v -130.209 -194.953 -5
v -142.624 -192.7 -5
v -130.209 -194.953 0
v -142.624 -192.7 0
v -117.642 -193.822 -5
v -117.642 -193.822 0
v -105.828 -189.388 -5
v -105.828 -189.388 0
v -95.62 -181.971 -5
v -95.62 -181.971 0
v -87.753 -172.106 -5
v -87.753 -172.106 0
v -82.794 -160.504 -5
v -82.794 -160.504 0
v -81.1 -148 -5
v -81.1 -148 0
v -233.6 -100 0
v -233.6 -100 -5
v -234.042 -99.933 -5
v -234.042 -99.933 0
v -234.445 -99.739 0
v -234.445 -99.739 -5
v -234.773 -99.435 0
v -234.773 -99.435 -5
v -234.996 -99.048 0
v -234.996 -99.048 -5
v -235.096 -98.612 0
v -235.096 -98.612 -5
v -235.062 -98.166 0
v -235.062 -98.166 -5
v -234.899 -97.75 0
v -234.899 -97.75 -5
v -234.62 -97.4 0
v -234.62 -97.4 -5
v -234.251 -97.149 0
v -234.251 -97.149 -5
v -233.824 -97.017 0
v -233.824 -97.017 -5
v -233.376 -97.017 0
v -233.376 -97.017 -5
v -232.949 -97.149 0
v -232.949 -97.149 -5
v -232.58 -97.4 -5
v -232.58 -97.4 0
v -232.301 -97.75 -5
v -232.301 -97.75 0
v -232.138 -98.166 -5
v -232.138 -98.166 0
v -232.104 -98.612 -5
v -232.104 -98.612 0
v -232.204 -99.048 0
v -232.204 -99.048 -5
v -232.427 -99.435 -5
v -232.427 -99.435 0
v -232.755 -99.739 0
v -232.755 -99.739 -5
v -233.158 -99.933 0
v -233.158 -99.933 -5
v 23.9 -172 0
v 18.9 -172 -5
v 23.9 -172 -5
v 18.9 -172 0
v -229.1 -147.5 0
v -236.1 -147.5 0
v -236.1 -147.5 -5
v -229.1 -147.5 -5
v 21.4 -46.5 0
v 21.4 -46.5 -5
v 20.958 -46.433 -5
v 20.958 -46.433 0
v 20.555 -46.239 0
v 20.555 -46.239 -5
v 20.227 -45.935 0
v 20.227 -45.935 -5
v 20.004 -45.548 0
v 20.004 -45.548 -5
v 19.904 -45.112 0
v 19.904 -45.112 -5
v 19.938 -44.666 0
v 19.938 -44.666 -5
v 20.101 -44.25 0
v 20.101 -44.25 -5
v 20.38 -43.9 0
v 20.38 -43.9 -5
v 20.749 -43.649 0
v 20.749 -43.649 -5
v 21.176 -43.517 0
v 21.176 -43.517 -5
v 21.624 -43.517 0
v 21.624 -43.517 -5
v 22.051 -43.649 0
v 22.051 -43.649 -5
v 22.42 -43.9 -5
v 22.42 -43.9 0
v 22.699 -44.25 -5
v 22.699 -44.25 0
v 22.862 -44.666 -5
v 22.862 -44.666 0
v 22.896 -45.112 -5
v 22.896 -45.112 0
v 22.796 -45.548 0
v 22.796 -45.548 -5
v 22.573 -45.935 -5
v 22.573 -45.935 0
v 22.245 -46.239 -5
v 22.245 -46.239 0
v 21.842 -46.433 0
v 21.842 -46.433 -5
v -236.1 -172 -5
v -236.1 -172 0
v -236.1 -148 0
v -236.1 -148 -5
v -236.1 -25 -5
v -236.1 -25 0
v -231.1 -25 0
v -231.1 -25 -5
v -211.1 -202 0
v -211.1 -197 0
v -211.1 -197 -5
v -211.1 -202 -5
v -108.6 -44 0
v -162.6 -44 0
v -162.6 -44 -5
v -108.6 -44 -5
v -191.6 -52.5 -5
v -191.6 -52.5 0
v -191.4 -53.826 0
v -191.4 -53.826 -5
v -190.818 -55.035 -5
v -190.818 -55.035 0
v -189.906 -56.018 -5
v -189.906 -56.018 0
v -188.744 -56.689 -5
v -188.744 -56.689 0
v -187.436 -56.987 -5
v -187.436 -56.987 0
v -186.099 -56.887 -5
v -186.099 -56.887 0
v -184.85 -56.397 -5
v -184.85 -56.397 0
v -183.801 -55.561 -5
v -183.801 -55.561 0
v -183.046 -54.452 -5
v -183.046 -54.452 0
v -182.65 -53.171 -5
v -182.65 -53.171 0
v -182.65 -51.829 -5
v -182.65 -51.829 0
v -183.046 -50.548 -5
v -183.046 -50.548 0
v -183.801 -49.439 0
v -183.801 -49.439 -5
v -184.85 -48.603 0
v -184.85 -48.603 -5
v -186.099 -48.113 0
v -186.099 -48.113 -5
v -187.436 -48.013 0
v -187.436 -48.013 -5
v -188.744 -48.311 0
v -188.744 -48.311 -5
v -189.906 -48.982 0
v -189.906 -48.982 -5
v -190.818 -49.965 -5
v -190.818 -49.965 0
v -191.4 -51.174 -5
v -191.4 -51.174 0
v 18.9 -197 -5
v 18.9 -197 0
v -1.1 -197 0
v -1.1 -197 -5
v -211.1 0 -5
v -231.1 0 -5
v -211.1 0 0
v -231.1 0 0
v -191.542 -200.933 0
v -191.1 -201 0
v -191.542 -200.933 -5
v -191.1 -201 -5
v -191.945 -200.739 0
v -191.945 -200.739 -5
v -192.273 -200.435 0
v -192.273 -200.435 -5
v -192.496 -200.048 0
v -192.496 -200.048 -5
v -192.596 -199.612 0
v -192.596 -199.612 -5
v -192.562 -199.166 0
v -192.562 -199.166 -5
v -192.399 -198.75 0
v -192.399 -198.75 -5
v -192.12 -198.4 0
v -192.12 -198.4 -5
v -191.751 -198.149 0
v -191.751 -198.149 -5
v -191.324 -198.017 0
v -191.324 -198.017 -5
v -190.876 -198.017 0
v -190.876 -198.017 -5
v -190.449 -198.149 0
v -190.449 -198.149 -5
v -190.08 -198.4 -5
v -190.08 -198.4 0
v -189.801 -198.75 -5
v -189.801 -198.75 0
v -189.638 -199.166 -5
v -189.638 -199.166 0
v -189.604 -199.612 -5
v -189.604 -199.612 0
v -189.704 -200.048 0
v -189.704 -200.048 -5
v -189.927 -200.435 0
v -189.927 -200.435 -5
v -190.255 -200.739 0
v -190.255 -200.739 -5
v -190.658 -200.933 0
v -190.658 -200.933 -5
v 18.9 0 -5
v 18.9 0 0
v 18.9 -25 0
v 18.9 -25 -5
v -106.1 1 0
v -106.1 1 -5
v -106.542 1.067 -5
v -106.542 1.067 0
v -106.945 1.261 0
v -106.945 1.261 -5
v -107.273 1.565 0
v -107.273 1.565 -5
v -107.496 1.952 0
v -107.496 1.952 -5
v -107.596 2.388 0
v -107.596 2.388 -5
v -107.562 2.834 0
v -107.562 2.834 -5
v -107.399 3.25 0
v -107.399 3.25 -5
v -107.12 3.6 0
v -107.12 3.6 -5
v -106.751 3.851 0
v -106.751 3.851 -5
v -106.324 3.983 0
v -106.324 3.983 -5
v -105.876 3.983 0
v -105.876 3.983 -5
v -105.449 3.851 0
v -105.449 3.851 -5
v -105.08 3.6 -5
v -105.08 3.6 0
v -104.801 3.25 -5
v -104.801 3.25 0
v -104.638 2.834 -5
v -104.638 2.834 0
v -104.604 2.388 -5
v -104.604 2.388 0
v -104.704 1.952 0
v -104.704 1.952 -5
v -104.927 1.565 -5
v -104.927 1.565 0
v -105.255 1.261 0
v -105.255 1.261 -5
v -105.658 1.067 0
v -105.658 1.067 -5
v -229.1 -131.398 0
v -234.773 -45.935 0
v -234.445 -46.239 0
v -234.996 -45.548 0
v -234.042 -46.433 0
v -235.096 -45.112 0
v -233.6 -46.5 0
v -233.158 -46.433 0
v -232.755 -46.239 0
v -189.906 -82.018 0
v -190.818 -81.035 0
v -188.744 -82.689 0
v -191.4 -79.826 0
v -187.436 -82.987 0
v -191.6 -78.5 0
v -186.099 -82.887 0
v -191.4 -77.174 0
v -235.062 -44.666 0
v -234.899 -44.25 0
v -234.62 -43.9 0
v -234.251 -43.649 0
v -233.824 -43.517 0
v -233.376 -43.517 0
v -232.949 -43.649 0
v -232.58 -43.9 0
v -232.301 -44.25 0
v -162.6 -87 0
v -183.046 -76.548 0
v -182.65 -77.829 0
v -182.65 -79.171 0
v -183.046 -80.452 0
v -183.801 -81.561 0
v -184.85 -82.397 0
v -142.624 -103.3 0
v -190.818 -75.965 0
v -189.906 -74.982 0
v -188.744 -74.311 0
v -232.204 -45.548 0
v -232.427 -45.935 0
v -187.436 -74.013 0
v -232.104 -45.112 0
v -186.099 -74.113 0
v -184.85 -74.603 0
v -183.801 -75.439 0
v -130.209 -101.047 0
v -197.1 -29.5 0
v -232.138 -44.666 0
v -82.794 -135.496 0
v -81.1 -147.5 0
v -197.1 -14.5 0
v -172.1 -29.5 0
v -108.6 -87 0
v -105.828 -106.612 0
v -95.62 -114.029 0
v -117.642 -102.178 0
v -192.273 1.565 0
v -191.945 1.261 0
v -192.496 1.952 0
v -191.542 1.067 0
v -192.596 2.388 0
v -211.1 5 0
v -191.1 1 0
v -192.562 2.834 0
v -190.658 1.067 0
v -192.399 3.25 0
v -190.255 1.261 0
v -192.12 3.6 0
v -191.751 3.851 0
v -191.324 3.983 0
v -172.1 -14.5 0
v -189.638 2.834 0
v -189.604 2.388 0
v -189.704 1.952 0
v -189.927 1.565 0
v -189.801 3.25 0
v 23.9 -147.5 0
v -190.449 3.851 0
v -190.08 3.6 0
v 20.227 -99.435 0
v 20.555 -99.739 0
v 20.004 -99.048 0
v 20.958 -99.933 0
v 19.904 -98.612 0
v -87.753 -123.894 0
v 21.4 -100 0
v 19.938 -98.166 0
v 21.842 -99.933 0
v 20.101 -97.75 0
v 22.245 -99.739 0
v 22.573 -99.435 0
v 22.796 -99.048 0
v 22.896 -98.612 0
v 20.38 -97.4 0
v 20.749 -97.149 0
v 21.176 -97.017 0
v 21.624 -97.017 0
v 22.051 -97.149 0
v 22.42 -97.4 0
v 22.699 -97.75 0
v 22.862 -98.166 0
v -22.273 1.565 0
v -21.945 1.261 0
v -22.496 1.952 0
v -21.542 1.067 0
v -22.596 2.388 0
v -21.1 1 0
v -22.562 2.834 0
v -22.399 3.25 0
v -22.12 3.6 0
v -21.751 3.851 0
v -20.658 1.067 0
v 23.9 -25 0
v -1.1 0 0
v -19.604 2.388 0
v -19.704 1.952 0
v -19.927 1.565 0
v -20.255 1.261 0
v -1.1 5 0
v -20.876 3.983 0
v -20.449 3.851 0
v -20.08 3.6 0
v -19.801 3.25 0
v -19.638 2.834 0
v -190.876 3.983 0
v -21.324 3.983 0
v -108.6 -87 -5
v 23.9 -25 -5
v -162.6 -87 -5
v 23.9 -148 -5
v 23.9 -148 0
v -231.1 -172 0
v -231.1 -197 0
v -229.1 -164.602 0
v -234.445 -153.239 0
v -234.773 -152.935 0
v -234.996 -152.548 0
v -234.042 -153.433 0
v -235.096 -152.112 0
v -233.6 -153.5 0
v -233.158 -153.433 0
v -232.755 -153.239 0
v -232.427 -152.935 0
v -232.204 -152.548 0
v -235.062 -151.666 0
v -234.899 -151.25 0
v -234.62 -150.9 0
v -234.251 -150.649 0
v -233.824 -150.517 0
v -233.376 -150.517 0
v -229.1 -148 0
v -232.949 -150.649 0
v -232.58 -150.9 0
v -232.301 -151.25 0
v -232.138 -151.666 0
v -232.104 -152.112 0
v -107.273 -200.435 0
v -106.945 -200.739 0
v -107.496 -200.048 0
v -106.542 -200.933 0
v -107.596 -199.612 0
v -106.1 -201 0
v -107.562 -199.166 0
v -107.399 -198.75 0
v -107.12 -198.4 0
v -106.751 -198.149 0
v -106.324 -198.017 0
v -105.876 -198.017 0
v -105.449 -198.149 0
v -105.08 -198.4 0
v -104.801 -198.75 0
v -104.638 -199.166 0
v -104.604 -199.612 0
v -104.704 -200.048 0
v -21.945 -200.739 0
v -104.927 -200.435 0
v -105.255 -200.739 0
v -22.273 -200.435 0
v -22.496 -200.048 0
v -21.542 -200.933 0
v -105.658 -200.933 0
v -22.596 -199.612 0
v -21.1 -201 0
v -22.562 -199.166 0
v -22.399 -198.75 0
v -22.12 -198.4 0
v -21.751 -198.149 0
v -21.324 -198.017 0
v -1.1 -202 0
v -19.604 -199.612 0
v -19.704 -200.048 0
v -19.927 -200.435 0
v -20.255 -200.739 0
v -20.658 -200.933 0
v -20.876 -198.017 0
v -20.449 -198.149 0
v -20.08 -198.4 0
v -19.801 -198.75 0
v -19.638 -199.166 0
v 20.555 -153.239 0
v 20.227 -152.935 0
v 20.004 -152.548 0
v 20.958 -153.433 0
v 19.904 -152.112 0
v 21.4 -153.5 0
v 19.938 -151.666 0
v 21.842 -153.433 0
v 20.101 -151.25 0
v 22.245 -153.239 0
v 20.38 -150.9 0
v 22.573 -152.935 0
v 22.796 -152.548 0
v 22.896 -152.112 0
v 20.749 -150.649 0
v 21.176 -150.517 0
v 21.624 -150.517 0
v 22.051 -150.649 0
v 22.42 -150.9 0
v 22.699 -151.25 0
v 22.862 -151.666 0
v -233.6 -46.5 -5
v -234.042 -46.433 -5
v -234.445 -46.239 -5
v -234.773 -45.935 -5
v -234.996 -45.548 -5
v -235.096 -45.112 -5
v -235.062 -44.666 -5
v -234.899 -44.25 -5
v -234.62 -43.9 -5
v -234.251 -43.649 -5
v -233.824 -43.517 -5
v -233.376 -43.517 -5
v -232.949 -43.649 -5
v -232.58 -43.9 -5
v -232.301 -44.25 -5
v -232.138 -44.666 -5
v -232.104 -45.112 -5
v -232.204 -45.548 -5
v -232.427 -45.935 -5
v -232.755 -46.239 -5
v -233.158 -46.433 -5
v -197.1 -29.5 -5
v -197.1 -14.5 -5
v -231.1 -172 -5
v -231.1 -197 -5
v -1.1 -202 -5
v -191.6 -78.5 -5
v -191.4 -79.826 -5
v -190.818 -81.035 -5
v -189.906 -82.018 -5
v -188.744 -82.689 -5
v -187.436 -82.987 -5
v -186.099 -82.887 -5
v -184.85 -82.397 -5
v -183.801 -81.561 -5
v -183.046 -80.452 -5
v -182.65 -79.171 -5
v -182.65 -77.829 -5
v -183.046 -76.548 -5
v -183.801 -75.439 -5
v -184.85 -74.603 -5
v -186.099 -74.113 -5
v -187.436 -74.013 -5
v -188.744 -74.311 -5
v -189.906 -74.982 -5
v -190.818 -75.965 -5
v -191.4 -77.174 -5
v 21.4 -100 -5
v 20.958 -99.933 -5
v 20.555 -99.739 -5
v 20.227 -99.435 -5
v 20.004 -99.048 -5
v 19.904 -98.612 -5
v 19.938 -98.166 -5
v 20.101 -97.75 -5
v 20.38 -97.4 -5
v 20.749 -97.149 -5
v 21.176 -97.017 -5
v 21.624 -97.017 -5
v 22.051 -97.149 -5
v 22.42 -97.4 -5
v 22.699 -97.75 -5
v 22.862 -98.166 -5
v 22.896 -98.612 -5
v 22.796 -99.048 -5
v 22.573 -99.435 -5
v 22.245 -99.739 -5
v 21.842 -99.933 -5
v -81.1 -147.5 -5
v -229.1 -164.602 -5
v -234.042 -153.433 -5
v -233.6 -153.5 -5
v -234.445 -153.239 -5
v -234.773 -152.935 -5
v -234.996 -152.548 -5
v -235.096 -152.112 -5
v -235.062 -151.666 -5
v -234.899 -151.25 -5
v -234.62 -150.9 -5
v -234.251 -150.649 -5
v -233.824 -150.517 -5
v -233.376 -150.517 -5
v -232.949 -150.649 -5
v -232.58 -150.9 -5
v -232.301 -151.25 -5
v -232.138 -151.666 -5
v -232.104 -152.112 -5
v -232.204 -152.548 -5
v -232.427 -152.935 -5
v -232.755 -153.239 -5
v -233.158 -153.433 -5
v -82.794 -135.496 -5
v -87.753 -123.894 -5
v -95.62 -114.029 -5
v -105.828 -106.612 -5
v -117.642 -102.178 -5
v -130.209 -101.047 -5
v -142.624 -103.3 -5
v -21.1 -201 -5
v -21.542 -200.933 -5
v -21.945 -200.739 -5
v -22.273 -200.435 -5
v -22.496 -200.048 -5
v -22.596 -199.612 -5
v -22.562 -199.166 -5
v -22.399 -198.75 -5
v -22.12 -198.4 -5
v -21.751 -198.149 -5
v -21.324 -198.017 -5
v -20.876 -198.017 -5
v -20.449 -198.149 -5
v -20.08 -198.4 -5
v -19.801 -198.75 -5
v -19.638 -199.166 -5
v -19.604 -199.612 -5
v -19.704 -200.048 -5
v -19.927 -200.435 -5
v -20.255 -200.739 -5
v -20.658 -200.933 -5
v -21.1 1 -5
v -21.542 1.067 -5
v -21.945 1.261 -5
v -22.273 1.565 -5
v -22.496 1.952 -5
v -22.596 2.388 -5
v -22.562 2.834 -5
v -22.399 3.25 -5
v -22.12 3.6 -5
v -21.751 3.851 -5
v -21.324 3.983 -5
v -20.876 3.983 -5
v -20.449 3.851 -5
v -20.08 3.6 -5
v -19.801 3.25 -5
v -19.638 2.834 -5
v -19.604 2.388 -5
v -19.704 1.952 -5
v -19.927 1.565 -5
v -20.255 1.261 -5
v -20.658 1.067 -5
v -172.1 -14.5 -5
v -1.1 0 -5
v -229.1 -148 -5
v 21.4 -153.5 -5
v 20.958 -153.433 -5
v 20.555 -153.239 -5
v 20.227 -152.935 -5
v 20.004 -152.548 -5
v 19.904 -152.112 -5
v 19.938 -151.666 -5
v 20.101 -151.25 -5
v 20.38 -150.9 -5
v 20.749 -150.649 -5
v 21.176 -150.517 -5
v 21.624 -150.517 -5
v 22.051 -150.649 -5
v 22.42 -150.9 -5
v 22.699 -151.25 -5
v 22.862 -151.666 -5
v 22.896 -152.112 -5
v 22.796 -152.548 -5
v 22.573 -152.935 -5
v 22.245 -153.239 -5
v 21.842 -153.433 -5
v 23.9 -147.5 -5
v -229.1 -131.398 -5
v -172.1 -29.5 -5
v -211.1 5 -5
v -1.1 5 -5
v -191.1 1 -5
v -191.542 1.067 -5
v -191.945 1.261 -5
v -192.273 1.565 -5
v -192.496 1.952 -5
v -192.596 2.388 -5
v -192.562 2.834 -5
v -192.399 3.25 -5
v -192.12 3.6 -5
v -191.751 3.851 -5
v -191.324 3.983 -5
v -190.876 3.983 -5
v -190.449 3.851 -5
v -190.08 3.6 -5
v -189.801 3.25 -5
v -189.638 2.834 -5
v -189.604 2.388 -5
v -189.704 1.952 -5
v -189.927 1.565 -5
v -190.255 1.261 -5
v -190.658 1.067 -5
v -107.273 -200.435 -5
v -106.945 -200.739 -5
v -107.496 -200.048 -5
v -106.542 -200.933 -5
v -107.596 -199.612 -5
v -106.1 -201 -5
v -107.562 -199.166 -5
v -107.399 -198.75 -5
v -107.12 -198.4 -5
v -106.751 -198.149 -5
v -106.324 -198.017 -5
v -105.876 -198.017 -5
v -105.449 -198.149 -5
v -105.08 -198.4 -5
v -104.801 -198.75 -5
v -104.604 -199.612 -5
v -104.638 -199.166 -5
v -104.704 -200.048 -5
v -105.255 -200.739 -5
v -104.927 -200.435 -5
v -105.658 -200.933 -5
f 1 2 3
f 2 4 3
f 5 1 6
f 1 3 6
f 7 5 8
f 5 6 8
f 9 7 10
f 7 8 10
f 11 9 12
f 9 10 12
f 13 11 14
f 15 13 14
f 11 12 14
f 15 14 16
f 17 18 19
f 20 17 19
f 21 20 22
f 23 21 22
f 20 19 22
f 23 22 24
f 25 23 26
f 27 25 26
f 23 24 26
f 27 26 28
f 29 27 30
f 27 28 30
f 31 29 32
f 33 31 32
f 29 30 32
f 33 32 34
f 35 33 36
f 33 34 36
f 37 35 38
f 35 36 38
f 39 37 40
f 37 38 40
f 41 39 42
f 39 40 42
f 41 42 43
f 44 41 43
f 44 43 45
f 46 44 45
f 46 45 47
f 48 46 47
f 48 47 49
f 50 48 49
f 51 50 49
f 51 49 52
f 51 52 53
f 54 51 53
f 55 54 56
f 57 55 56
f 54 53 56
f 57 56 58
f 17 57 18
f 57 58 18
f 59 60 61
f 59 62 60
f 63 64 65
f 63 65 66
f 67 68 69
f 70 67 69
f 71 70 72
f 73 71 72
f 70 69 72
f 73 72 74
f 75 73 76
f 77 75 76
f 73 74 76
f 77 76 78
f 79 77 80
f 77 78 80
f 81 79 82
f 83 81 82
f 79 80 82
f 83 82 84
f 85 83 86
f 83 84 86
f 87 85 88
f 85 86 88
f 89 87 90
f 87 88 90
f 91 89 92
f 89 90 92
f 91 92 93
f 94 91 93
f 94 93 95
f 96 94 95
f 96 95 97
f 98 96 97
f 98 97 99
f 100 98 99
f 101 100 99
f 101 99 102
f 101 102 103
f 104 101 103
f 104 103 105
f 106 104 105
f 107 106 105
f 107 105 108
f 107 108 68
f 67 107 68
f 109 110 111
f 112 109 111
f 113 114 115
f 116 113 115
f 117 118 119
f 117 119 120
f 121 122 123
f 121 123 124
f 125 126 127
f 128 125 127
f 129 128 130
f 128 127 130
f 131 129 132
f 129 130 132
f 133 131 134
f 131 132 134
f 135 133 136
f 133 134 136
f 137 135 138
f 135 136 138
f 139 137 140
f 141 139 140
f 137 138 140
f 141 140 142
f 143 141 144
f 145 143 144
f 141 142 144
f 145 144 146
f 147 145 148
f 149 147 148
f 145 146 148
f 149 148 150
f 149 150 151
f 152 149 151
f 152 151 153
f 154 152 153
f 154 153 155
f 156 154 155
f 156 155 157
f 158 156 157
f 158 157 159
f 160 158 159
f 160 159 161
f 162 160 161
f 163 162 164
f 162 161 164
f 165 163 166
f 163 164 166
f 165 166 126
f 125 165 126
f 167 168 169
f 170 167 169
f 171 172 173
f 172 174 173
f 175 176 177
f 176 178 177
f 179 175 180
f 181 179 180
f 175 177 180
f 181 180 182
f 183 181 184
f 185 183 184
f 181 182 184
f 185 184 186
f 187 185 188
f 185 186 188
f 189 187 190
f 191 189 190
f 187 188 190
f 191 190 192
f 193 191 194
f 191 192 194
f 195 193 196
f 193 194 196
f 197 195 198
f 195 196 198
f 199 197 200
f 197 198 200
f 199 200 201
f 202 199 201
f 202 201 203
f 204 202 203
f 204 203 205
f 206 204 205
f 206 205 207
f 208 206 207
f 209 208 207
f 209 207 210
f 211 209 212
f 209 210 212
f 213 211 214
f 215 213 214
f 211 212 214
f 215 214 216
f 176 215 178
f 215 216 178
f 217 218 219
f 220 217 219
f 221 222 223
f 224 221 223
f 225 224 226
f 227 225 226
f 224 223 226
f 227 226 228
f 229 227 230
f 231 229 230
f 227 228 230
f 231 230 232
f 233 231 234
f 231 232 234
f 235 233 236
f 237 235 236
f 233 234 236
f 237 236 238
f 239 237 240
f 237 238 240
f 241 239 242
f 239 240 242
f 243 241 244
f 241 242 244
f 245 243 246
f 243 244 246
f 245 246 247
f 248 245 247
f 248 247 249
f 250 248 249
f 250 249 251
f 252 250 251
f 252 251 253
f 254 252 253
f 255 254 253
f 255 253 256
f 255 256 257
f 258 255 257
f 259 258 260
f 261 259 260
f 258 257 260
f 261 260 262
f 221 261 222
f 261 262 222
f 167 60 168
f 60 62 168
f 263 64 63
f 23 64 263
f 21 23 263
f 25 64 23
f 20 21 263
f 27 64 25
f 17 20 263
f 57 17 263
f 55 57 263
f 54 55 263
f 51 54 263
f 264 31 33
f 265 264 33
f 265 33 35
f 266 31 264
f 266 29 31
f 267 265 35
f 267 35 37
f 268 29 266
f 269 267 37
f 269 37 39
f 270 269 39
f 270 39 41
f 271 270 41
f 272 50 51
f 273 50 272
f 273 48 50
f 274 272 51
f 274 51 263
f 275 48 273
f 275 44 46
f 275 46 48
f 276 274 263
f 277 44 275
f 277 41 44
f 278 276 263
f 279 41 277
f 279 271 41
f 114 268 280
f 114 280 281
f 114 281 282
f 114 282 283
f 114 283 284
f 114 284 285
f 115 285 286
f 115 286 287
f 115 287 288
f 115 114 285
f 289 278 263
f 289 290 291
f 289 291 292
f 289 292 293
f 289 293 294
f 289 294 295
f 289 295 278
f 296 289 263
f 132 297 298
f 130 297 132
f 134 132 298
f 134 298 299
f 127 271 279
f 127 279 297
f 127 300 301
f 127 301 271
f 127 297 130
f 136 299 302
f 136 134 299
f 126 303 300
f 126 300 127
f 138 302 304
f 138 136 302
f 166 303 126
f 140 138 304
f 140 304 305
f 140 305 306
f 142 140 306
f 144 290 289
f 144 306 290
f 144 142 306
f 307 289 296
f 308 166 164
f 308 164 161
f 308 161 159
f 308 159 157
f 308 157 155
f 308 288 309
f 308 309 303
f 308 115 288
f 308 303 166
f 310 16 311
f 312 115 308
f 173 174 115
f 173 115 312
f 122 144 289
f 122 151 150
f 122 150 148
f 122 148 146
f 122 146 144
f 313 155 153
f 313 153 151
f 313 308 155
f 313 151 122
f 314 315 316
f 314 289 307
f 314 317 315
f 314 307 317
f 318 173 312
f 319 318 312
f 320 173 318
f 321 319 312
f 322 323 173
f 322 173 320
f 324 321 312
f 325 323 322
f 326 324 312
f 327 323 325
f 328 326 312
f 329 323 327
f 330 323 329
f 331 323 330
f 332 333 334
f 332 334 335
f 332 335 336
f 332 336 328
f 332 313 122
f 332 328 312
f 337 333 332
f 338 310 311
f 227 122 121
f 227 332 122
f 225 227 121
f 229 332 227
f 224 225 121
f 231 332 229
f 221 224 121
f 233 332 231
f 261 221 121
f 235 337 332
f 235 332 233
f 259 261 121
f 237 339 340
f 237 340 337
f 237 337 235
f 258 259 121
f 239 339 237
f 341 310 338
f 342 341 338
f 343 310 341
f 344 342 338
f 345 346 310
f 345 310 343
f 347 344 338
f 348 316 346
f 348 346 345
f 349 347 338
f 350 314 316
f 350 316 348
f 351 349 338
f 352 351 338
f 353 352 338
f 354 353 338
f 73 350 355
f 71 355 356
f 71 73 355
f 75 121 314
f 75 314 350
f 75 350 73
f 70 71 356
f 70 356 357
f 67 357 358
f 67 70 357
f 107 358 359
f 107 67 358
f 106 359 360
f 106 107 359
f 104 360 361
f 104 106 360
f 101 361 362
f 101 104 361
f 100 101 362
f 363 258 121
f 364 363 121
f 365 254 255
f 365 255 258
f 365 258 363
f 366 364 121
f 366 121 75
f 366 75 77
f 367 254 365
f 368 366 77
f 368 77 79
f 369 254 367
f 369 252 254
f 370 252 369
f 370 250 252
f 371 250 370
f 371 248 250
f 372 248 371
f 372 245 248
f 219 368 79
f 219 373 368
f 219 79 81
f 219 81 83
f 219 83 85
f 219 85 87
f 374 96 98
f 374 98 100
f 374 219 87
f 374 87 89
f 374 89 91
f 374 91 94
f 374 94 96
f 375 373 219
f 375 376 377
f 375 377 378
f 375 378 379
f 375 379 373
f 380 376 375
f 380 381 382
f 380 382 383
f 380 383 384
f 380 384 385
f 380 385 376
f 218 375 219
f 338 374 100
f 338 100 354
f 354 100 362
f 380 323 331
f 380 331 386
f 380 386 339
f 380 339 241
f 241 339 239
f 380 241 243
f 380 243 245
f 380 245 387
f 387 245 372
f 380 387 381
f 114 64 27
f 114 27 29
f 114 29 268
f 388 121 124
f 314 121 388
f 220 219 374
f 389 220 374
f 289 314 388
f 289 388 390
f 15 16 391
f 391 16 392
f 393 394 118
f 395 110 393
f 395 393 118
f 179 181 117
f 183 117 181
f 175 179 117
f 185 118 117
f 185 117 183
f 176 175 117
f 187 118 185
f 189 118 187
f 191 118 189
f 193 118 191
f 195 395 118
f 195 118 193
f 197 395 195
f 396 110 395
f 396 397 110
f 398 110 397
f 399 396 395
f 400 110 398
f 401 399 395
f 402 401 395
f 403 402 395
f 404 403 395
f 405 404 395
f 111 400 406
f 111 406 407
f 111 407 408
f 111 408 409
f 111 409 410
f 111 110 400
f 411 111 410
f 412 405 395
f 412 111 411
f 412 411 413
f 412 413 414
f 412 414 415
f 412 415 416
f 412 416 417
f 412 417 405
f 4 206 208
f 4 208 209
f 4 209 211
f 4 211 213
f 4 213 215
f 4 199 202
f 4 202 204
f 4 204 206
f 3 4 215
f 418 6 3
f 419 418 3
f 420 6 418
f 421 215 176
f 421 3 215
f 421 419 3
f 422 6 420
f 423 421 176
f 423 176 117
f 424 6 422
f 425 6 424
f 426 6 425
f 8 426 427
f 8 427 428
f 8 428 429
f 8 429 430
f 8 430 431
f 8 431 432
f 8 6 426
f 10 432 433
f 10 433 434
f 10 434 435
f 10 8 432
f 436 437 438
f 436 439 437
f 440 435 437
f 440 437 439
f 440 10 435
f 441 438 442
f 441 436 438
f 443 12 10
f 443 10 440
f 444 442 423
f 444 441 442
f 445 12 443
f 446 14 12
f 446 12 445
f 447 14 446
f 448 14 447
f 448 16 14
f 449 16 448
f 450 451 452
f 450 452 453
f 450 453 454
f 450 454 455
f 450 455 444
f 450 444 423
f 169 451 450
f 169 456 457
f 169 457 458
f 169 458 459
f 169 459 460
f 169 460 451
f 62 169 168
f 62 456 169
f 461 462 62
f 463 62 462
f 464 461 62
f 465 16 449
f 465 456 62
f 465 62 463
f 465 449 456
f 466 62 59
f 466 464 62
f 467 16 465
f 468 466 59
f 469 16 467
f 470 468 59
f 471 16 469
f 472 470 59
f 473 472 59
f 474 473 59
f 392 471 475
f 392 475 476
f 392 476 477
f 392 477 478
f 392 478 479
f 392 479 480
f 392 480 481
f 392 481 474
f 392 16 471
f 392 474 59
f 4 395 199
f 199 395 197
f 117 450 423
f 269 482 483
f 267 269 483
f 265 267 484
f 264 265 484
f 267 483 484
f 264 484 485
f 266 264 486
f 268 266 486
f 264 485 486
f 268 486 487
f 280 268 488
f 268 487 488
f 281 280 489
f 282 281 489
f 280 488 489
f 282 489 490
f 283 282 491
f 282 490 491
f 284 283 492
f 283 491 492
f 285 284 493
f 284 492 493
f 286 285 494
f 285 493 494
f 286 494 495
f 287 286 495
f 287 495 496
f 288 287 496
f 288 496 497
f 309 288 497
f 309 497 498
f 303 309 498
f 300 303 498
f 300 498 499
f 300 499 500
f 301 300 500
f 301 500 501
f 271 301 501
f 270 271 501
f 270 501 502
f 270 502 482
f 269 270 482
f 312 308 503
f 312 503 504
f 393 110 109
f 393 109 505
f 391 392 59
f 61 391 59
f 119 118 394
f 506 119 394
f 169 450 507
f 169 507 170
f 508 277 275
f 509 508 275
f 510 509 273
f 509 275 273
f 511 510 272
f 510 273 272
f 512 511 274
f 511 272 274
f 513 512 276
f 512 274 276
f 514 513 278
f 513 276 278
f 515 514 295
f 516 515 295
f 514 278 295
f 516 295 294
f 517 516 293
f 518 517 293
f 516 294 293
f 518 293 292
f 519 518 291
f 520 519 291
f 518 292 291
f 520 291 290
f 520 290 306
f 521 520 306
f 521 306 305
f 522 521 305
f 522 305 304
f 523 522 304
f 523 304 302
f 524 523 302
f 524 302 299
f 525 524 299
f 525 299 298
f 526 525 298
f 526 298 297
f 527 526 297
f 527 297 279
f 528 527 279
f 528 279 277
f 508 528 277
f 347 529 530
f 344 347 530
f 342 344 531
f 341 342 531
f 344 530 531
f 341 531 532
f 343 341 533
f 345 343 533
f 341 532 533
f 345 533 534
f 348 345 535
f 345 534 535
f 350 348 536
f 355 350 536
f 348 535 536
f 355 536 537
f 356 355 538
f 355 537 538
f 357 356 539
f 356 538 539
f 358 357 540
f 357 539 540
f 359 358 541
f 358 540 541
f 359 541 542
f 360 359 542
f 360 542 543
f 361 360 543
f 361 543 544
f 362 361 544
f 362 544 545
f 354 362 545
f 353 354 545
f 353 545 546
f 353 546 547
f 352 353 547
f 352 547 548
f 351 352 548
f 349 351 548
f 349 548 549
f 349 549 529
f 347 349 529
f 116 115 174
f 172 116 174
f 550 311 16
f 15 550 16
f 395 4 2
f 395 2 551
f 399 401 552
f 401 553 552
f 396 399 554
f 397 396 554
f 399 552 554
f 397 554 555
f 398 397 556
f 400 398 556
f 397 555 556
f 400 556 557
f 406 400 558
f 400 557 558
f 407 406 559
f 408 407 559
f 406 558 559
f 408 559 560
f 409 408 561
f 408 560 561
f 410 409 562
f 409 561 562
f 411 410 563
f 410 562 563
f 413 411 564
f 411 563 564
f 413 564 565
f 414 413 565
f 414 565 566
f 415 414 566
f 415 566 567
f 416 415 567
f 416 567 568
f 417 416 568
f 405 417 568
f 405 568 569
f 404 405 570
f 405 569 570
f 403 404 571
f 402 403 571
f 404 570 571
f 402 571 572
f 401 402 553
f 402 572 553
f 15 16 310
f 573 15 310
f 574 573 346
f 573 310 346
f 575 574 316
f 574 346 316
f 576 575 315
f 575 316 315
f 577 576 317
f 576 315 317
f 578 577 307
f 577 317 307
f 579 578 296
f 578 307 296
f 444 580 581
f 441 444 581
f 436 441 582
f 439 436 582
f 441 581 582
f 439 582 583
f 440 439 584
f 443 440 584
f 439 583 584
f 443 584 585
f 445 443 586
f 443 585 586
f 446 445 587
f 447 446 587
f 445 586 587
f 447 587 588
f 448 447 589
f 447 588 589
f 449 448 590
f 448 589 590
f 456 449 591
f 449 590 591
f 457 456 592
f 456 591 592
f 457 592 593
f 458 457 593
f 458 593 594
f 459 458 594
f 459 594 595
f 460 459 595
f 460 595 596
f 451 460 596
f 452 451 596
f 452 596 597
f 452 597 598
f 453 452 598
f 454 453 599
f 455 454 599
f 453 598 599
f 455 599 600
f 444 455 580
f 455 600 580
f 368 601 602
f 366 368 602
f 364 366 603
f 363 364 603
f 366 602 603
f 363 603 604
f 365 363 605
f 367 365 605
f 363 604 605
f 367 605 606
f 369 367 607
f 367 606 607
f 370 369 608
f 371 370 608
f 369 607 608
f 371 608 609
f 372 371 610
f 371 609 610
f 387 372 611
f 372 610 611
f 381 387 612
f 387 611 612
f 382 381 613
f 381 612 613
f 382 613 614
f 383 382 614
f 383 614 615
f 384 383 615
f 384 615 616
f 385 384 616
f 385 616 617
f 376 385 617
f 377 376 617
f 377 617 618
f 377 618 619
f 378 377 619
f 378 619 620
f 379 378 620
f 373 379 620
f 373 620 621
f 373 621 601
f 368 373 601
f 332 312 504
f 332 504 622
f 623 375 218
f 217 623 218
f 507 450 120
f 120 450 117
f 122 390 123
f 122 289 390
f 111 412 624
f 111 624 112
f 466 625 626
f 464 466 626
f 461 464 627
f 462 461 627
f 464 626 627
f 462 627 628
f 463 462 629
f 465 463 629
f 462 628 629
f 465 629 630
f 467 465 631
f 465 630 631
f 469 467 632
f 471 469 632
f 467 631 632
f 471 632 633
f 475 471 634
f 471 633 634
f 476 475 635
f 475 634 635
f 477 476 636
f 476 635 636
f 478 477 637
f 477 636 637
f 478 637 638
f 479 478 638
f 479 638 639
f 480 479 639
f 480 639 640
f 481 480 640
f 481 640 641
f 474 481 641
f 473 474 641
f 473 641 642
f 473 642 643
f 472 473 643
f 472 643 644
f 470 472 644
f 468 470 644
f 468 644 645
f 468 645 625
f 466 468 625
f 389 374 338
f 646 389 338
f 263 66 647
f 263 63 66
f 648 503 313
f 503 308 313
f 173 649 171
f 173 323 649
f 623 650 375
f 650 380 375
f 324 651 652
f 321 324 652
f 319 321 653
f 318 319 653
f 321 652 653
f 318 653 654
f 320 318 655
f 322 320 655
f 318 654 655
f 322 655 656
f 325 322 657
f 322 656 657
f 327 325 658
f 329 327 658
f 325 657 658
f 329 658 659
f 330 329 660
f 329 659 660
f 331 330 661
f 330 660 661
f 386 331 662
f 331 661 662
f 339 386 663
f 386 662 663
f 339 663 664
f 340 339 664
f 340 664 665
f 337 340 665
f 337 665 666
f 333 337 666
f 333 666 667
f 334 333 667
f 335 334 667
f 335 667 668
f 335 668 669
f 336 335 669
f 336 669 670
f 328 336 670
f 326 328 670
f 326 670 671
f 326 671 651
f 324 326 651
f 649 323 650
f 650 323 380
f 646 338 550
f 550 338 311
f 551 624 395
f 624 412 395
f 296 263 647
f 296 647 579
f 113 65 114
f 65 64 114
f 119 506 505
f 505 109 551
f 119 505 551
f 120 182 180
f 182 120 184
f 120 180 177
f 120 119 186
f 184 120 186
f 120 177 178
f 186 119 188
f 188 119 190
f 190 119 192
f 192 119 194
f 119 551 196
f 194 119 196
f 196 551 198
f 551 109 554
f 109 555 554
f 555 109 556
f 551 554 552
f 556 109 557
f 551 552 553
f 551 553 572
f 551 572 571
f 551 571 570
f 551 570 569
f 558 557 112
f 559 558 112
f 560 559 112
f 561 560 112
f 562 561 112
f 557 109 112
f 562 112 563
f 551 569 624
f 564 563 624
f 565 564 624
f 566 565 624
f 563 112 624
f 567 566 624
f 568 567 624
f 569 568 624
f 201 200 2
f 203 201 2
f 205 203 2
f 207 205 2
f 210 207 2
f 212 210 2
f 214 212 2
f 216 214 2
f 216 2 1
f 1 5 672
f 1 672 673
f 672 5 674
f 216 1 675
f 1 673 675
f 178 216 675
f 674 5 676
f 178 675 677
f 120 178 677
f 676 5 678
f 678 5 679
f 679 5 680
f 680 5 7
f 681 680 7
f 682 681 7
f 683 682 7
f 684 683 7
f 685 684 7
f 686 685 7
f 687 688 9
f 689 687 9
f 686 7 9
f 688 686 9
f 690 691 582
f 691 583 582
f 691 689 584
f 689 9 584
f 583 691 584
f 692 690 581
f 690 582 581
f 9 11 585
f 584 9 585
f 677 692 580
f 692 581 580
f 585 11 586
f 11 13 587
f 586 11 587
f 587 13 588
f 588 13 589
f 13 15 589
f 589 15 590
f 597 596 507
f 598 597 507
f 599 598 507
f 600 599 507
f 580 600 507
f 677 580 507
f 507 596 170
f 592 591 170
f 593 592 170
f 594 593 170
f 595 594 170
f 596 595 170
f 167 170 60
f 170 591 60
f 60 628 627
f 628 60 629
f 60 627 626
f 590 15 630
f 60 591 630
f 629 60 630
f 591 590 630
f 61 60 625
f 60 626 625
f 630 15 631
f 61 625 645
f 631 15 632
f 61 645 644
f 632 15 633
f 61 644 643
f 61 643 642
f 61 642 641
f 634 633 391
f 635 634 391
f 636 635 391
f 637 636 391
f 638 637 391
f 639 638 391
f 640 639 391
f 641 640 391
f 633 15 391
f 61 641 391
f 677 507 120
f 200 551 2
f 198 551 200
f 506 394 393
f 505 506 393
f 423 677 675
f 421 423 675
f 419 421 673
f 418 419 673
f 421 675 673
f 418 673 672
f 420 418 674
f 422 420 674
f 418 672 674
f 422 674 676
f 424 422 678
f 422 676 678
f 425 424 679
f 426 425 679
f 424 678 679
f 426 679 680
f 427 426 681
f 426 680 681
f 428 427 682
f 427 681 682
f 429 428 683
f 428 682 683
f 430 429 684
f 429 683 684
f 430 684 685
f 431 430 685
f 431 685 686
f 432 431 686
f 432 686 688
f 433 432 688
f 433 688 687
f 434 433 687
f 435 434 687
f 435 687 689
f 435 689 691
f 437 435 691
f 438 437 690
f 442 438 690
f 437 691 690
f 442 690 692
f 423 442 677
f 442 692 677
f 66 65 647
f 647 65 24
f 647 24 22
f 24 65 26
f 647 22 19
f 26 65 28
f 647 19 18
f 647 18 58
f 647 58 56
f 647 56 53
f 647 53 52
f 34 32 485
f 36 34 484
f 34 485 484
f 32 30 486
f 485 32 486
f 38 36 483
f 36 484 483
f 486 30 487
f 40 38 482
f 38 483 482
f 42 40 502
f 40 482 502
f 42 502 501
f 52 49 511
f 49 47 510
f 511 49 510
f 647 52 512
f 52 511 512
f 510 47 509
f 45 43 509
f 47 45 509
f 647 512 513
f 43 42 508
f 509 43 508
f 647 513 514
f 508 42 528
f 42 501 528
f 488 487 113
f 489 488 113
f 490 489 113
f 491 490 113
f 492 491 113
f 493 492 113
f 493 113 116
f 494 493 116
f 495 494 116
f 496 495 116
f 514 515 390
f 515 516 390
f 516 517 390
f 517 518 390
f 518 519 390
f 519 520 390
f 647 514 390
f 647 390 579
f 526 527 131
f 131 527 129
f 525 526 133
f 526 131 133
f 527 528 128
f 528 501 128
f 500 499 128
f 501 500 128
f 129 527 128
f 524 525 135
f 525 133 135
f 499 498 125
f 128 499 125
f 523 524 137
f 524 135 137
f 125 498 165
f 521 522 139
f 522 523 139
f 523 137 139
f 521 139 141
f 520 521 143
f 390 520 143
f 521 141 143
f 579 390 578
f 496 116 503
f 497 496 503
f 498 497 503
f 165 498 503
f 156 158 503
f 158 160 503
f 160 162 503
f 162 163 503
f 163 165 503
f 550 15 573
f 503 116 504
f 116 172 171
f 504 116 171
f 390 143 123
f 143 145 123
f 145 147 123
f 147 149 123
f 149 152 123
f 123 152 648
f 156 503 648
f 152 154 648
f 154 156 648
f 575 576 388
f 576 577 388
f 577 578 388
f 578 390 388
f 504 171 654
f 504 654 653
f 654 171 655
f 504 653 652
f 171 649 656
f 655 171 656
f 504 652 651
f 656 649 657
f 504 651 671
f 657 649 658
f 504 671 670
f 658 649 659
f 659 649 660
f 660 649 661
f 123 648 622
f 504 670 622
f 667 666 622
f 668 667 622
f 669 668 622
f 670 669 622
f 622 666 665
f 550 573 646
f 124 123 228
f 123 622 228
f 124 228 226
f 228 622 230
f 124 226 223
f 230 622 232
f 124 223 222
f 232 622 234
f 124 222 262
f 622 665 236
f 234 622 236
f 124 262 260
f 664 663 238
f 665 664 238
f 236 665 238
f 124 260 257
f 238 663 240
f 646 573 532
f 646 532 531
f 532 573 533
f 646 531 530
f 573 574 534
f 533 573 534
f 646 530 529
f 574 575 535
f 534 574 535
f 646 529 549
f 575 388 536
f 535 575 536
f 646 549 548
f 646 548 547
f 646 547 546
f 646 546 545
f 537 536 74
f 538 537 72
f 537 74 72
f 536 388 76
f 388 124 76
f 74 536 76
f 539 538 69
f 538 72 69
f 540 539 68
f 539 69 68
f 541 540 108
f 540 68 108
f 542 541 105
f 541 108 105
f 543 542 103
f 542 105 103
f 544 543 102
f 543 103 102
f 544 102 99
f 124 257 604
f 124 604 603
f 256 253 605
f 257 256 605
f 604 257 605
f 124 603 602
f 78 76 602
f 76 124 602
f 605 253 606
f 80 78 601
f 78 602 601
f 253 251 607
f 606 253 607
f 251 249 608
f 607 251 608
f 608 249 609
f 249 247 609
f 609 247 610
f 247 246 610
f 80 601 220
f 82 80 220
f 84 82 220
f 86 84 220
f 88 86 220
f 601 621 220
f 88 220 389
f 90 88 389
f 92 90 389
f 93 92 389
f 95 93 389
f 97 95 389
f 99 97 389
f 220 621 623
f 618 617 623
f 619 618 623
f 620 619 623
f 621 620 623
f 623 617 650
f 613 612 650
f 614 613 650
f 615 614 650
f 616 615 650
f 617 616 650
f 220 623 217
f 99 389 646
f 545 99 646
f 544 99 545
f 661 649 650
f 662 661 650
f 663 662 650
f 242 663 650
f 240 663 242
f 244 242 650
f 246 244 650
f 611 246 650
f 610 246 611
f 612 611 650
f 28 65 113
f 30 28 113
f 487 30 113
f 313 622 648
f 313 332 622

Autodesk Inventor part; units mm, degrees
ref_plane "YZ Plane" through (0, 0, 0) normal (1, 0, 0) x (0, 1, 0)
ref_plane "XZ Plane" through (0, 0, 0) normal (0, 1, 0) x (-1, 0, 0)
ref_plane "XY Plane" through (0, 0, 0) normal (0, 0, 1) x (1, 0, 0)
sketch "Sketch1" plane through (0, 0, 0) normal (0, 0, 1) x (1, 0, 0)
  line L0 (-236.1, 0) -> (-211.1, 0) construction
  line L1 (-211.1, 0) -> (-211.1, 5) construction
  line L2 (-236.1, 5) -> (-211.1, 5) construction
  line L3 (-236.1, 0) -> (-236.1, 5) construction
  circle A0 centre (-21.1, 2.5) radius 1.2295 construction
  circle A1 centre (-106.1, 2.5) radius 1.2295 construction
  circle A2 centre (-191.1, 2.5) radius 1.2295 construction
  line L4 (-211.1, 0) -> (0, 0) construction
  line L5 (-1.1, 0) -> (-1.1, 5) construction
  line L6 (-211.1, 5) -> (-1.1, 5) construction
  line L7 (-211.1, 0) -> (-211.1, 5) construction
  line L8 (0, 0) -> (23.9, 0) construction
  line L9 (23.9, 0) -> (23.9, 5) construction
  line L10 (-1.1, 5) -> (23.9, 5) construction
  line L11 (-1.1, 0) -> (-1.1, 5) construction
  line L12 (18.9, 0) -> (18.9, -25) construction
  line L13 (18.9, -25) -> (23.9, -25) construction
  line L14 (23.9, 0) -> (23.9, -25) construction
  line L15 (18.9, 0) -> (23.9, 0) construction
  circle A3 centre (21.4, -45) radius 1.2295 construction
  circle A4 centre (21.4, -98.5) radius 1.2295 construction
  circle A5 centre (21.4, -152) radius 1.2295 construction
  line L16 (18.9, -25) -> (18.9, -172) construction
  line L17 (18.9, -172) -> (23.9, -172) construction
  line L18 (23.9, -25) -> (23.9, -172) construction
  line L19 (18.9, -25) -> (23.9, -25) construction
  line L20 (-236.1, 0) -> (-236.1, -25) construction
  line L21 (-236.1, -25) -> (-231.1, -25) construction
  line L22 (-231.1, 0) -> (-231.1, -25) construction
  line L23 (-236.1, 0) -> (-231.1, 0) construction
  circle A6 centre (-233.6, -45) radius 1.2295 construction
  circle A7 centre (-233.6, -98.5) radius 1.2295 construction
  circle A8 centre (-233.6, -152) radius 1.2295 construction
  line L24 (-236.1, -25) -> (-236.1, -172) construction
  line L25 (-236.1, -172) -> (-231.1, -172) construction
  line L26 (-231.1, -25) -> (-231.1, -172) construction
  line L27 (-236.1, -25) -> (-231.1, -25) construction
  line L28 (-236.1, -172) -> (-236.1, -197) construction
  line L29 (-236.1, -197) -> (-231.1, -197) construction
  line L30 (-231.1, -172) -> (-231.1, -197) construction
  line L31 (-236.1, -172) -> (-231.1, -172) construction
  line L32 (-211.1, -197) -> (-236.1, -197) construction
  line L33 (-236.1, -197) -> (-236.1, -202) construction
  line L34 (-211.1, -202) -> (-236.1, -202) construction
  line L35 (-211.1, -197) -> (-211.1, -202) construction
  circle A9 centre (-191.1, -199.5) radius 1.2295 construction
  circle A10 centre (-106.1, -199.5) radius 1.2295 construction
  circle A11 centre (-21.1, -199.5) radius 1.2295 construction
  line L36 (-1.1, -197) -> (-211.1, -197) construction
  line L37 (-211.1, -197) -> (-211.1, -202) construction
  line L38 (-1.1, -202) -> (-211.1, -202) construction
  line L39 (-1.1, -197) -> (-1.1, -202) construction
  line L40 (23.9, -197) -> (-1.1, -197) construction
  line L41 (-1.1, -197) -> (-1.1, -202) construction
  line L42 (23.9, -202) -> (-1.1, -202) construction
  line L43 (23.9, -197) -> (23.9, -202) construction
  line L44 (18.9, -172) -> (18.9, -197) construction
  line L45 (18.9, -197) -> (23.9, -197) construction
  line L46 (23.9, -172) -> (23.9, -197) construction
  line L47 (18.9, -172) -> (23.9, -172) construction
  line L48 (-1.1, -202) -> (-211.1, -202)
  line L49 (-211.1, -197) -> (-231.1, -197)
  line L50 (-231.1, -197) -> (-231.1, -172)
  line L51 (-236.1, -172) -> (-236.1, -25)
  line L52 (-231.1, -25) -> (-231.1, 0)
  line L53 (-231.1, 0) -> (-211.1, 0)
  line L54 (-211.1, 5) -> (-1.1, 5)
  line L55 (0, 0) -> (18.9, 0)
  line L56 (18.9, 0) -> (18.9, -25)
  line L57 (23.9, -25) -> (23.9, -172)
  line L58 (18.9, -172) -> (18.9, -197)
  line L59 (18.9, -197) -> (-1.1, -197)
  line L60 (-236.1, -172) -> (-231.1, -172)
  line L61 (-211.1, -197) -> (-211.1, -202)
  line L62 (-1.1, -202) -> (-1.1, -197)
  line L63 (18.9, -172) -> (23.9, -172)
  line L64 (18.9, -172) -> (18.9, -172)
  line L65 (18.9, -25) -> (23.9, -25)
  line L66 (18.9, -25) -> (18.9, -25)
  line L67 (-1.1, 5) -> (-1.1, 0)
  line L68 (-1.1, 0) -> (0, 0)
  line L69 (-211.1, 5) -> (-211.1, 0)
  line L70 (-211.1, 0) -> (-211.1, 0)
  line L71 (-236.1, -25) -> (-231.1, -25)
  line L72 (-231.1, -25) -> (-231.1, -25)
  dimension "d0" = 0
  dimension "d1" = 0
  dimension "d2" = 0
  dimension "d3" = 0
  dimension "d4" = 0
  dimension "d5" = 0
  dimension "d6" = 0
  dimension "d7" = 0
extrude "Extrusion1" add sketch "Sketch1" against normal blind 5
sketch "Sketch2" plane through (0, 0, 0) normal (0, 0, 1) x (1, 0, 0)
  circle A0 centre (-21.1, -199.5) radius 1.2295 construction
  circle A1 centre (-106.1, -199.5) radius 1.2295 construction
  circle A2 centre (-191.1, -199.5) radius 1.2295 construction
  circle A3 centre (-233.6, -152) radius 1.2295 construction
  circle A4 centre (-233.6, -98.5) radius 1.2295 construction
  circle A5 centre (-233.6, -45) radius 1.2295 construction
  circle A6 centre (-191.1, 2.5) radius 1.2295 construction
  circle A7 centre (-106.1, 2.5) radius 1.2295 construction
  circle A8 centre (-21.1, 2.5) radius 1.2295 construction
  circle A9 centre (21.4, -45) radius 1.2295 construction
  circle A10 centre (21.4, -98.5) radius 1.2295 construction
  circle A11 centre (21.4, -152) radius 1.2295 construction
  point P0 (0, 0)
hole "Hole1" [suppressed]
sketch "Sketch3" plane through (0, 0, 0) normal (0, 0, 1) x (1, 0, 0)
  line L0 (-226.1, -127) -> (-226.1, -167) construction
  line L1 (-226.1, -167) -> (-134.2686, -186.157) construction
  arc A0 (-134.2686, -186.157) -> (-134.2686, -107.843) centre (-126.1, -147) ccw construction
  line L2 (-134.2686, -107.843) -> (-226.1, -127) construction
  line L3 (-134.677, -188.1149) -> (-228.1, -168.6258)
  line L4 (-228.1, -168.6258) -> (-228.1, -125.3742)
  line L5 (-228.1, -125.3742) -> (-134.677, -105.8851)
  arc A1 (-134.677, -188.1149) -> (-134.677, -105.8851) centre (-126.1, -147) ccw
  circle A2 centre (-203.1, -97) radius 12.5
  point P0 (0, 0)
  dimension "d17" = 2
  dimension "d18" = 50
  dimension "d19" = 25
  dimension "d20" = 25
extrude "Extrusion2" [suppressed]
sketch "Sketch4" plane through (0, 0, 0) normal (0, 0, 1) x (1, 0, 0)
  circle A0 centre (-233.6, -152) radius 1.2295 construction
  circle A1 centre (-233.6, -98.5) radius 1.2295 construction
  circle A2 centre (-233.6, -45) radius 1.2295 construction
  circle A3 centre (-191.1, -199.5) radius 1.2295 construction
  circle A4 centre (-106.1, -199.5) radius 1.2295 construction
  circle A5 centre (-21.1, -199.5) radius 1.2295 construction
  circle A6 centre (21.4, -152) radius 1.2295 construction
  circle A7 centre (21.4, -98.5) radius 1.2295 construction
  circle A8 centre (21.4, -45) radius 1.2295 construction
  circle A9 centre (-21.1, 2.5) radius 1.2295 construction
  circle A10 centre (-106.1, 2.5) radius 1.2295 construction
  circle A11 centre (-191.1, 2.5) radius 1.2295 construction
  point P0 (0, 0)
hole "Hole2" at (-21.1, 2.5, 0) at (-106.1, 2.5, 0) at (-191.1, 2.5, 0) at (-233.6, -45, 0) at (-233.6, -98.5, 0) at (-233.6, -152, 0) at (-191.1, -199.5, 0) at (-106.1, -199.5, 0) at (-21.1, -199.5, 0) at (21.4, -152, 0) at (21.4, -98.5, 0) at (21.4, -45, 0) direction (0, 0, -1) diameter 3 end through all
sketch "Sketch5" plane through (0, 0, 0) normal (0, 0, 1) x (1, 0, 0)
  arc A0 (-81.1, -148) -> (-142.6238, -103.3003) centre (-128.1, -148) ccw projected
  arc A1 (-142.6238, -192.6997) -> (-81.1, -148) centre (-128.1, -148) ccw projected
  line L0 (-142.6238, -192.6997) -> (-229.1, -164.6018) projected
  line L1 (-229.1, -148) -> (-229.1, -164.6018) projected
  line L2 (-229.1, -148) -> (-229.1, -131.3982) projected
  line L3 (-229.1, -131.3982) -> (-142.6238, -103.3003) projected
  line L4 (-108.6, -87) -> (-162.6, -87) projected
  line L5 (-108.6, -44) -> (-108.6, -87) projected
  line L6 (-162.6, -87) -> (-162.6, -44) projected
  line L7 (-162.6, -44) -> (-108.6, -44) projected
  arc A2 (-182.6, -52.5) -> (-191.6, -52.5) centre (-187.1, -52.5) ccw projected
  arc A3 (-191.6, -52.5) -> (-182.6, -52.5) centre (-187.1, -52.5) ccw projected
  arc A4 (-182.6, -78.5) -> (-191.6, -78.5) centre (-187.1, -78.5) ccw projected
  arc A5 (-191.6, -78.5) -> (-182.6, -78.5) centre (-187.1, -78.5) ccw projected
  line L8 (-172.1, -14.5) -> (-172.1, -29.5) projected
  line L9 (-197.1, -29.5) -> (-172.1, -29.5) projected
  line L10 (-197.1, -29.5) -> (-197.1, -14.5) projected
  line L11 (-197.1, -14.5) -> (-172.1, -14.5) projected
  line L12 (23.9, -148) -> (-81.1, -148) construction
  circle A6 centre (21.4, -98.5) radius 1.5 construction
  circle A7 centre (-21.1, -199.5) radius 1.5 construction
  circle A8 centre (-191.1, -199.5) radius 1.5 construction
  circle A9 centre (-233.6, -98.5) radius 1.5 construction
  circle A10 centre (-191.1, 2.5) radius 1.5 construction
  circle A11 centre (-21.1, 2.5) radius 1.5 construction
  circle A12 centre (-106.1, 2.5) radius 1.5 construction
  circle A13 centre (-233.6, -45) radius 1.5 construction
  circle A14 centre (-233.6, -152) radius 1.5 construction
  circle A15 centre (-106.1, -199.5) radius 1.5 construction
  circle A16 centre (21.4, -152) radius 1.5 construction
  circle A17 centre (21.4, -45) radius 1.5 construction
  line L13 (-1.1, 0) -> (18.9, 0) construction
  line L14 (18.9, 0) -> (18.9, -25) construction
  line L15 (18.9, -25) -> (23.9, -25) construction
  line L16 (23.9, -25) -> (23.9, -172) construction
  line L17 (23.9, -172) -> (18.9, -172) construction
  line L18 (18.9, -172) -> (18.9, -197) construction
  line L19 (18.9, -197) -> (-1.1, -197) construction
  line L20 (-1.1, -197) -> (-1.1, -202) construction
  line L21 (-1.1, -202) -> (-211.1, -202) construction
  line L22 (-211.1, -202) -> (-211.1, -197) construction
  line L23 (-211.1, -197) -> (-231.1, -197) construction
  line L24 (-231.1, -197) -> (-231.1, -172) construction
  line L25 (-231.1, -172) -> (-236.1, -172) construction
  line L26 (-236.1, -172) -> (-236.1, -25) construction
  line L27 (-236.1, -25) -> (-231.1, -25) construction
  line L28 (-231.1, -25) -> (-231.1, 0) construction
  line L29 (-231.1, 0) -> (-211.1, 0) construction
  line L30 (-211.1, 0) -> (-211.1, 5) construction
  line L31 (-211.1, 5) -> (-1.1, 5) construction
  line L32 (-1.1, 5) -> (-1.1, 0) construction
  line L33 (-229.1, -148) -> (-241.1, -148) construction
  line L34 (-229.1, -148) -> (-241.1, -148) construction
  line L35 (-229.1, -148) -> (-241.1, -148) construction
  line L36 (-236.1, -172) -> (-236.1, -25) projected
  line L37 (-229.1, -148) -> (-236.1, -148)
  line L38 (-236.1, -148) -> (-236.1, -147.5)
  line L39 (-236.1, -147.5) -> (-229.1, -147.5)
  line L40 (-229.1, -147.5) -> (-229.1, -148)
  line L41 (23.9, -25) -> (23.9, -172) projected
  line L42 (-81.1, -148) -> (23.9, -148)
  line L43 (23.9, -148) -> (23.9, -147.5)
  line L44 (23.9, -147.5) -> (-81.1, -147.5)
  line L45 (-81.1, -147.5) -> (-81.1, -148)
  point P0 (0, 0)
  dimension "d30" = 0.5
  dimension "d31" = 0.5
extrude "Extrusion3" cut sketch "Sketch5" against normal through all
equation "\"d8\" = plate_thickness"
equation "\"plate_thickness\" = 5"
equation "\"basic_plate_offset\" = 0"
equation "\"ABS_tolerance\" = 0"
equation "\"laser_cutter_thickness\" = 0.1"
properties part number "top"
